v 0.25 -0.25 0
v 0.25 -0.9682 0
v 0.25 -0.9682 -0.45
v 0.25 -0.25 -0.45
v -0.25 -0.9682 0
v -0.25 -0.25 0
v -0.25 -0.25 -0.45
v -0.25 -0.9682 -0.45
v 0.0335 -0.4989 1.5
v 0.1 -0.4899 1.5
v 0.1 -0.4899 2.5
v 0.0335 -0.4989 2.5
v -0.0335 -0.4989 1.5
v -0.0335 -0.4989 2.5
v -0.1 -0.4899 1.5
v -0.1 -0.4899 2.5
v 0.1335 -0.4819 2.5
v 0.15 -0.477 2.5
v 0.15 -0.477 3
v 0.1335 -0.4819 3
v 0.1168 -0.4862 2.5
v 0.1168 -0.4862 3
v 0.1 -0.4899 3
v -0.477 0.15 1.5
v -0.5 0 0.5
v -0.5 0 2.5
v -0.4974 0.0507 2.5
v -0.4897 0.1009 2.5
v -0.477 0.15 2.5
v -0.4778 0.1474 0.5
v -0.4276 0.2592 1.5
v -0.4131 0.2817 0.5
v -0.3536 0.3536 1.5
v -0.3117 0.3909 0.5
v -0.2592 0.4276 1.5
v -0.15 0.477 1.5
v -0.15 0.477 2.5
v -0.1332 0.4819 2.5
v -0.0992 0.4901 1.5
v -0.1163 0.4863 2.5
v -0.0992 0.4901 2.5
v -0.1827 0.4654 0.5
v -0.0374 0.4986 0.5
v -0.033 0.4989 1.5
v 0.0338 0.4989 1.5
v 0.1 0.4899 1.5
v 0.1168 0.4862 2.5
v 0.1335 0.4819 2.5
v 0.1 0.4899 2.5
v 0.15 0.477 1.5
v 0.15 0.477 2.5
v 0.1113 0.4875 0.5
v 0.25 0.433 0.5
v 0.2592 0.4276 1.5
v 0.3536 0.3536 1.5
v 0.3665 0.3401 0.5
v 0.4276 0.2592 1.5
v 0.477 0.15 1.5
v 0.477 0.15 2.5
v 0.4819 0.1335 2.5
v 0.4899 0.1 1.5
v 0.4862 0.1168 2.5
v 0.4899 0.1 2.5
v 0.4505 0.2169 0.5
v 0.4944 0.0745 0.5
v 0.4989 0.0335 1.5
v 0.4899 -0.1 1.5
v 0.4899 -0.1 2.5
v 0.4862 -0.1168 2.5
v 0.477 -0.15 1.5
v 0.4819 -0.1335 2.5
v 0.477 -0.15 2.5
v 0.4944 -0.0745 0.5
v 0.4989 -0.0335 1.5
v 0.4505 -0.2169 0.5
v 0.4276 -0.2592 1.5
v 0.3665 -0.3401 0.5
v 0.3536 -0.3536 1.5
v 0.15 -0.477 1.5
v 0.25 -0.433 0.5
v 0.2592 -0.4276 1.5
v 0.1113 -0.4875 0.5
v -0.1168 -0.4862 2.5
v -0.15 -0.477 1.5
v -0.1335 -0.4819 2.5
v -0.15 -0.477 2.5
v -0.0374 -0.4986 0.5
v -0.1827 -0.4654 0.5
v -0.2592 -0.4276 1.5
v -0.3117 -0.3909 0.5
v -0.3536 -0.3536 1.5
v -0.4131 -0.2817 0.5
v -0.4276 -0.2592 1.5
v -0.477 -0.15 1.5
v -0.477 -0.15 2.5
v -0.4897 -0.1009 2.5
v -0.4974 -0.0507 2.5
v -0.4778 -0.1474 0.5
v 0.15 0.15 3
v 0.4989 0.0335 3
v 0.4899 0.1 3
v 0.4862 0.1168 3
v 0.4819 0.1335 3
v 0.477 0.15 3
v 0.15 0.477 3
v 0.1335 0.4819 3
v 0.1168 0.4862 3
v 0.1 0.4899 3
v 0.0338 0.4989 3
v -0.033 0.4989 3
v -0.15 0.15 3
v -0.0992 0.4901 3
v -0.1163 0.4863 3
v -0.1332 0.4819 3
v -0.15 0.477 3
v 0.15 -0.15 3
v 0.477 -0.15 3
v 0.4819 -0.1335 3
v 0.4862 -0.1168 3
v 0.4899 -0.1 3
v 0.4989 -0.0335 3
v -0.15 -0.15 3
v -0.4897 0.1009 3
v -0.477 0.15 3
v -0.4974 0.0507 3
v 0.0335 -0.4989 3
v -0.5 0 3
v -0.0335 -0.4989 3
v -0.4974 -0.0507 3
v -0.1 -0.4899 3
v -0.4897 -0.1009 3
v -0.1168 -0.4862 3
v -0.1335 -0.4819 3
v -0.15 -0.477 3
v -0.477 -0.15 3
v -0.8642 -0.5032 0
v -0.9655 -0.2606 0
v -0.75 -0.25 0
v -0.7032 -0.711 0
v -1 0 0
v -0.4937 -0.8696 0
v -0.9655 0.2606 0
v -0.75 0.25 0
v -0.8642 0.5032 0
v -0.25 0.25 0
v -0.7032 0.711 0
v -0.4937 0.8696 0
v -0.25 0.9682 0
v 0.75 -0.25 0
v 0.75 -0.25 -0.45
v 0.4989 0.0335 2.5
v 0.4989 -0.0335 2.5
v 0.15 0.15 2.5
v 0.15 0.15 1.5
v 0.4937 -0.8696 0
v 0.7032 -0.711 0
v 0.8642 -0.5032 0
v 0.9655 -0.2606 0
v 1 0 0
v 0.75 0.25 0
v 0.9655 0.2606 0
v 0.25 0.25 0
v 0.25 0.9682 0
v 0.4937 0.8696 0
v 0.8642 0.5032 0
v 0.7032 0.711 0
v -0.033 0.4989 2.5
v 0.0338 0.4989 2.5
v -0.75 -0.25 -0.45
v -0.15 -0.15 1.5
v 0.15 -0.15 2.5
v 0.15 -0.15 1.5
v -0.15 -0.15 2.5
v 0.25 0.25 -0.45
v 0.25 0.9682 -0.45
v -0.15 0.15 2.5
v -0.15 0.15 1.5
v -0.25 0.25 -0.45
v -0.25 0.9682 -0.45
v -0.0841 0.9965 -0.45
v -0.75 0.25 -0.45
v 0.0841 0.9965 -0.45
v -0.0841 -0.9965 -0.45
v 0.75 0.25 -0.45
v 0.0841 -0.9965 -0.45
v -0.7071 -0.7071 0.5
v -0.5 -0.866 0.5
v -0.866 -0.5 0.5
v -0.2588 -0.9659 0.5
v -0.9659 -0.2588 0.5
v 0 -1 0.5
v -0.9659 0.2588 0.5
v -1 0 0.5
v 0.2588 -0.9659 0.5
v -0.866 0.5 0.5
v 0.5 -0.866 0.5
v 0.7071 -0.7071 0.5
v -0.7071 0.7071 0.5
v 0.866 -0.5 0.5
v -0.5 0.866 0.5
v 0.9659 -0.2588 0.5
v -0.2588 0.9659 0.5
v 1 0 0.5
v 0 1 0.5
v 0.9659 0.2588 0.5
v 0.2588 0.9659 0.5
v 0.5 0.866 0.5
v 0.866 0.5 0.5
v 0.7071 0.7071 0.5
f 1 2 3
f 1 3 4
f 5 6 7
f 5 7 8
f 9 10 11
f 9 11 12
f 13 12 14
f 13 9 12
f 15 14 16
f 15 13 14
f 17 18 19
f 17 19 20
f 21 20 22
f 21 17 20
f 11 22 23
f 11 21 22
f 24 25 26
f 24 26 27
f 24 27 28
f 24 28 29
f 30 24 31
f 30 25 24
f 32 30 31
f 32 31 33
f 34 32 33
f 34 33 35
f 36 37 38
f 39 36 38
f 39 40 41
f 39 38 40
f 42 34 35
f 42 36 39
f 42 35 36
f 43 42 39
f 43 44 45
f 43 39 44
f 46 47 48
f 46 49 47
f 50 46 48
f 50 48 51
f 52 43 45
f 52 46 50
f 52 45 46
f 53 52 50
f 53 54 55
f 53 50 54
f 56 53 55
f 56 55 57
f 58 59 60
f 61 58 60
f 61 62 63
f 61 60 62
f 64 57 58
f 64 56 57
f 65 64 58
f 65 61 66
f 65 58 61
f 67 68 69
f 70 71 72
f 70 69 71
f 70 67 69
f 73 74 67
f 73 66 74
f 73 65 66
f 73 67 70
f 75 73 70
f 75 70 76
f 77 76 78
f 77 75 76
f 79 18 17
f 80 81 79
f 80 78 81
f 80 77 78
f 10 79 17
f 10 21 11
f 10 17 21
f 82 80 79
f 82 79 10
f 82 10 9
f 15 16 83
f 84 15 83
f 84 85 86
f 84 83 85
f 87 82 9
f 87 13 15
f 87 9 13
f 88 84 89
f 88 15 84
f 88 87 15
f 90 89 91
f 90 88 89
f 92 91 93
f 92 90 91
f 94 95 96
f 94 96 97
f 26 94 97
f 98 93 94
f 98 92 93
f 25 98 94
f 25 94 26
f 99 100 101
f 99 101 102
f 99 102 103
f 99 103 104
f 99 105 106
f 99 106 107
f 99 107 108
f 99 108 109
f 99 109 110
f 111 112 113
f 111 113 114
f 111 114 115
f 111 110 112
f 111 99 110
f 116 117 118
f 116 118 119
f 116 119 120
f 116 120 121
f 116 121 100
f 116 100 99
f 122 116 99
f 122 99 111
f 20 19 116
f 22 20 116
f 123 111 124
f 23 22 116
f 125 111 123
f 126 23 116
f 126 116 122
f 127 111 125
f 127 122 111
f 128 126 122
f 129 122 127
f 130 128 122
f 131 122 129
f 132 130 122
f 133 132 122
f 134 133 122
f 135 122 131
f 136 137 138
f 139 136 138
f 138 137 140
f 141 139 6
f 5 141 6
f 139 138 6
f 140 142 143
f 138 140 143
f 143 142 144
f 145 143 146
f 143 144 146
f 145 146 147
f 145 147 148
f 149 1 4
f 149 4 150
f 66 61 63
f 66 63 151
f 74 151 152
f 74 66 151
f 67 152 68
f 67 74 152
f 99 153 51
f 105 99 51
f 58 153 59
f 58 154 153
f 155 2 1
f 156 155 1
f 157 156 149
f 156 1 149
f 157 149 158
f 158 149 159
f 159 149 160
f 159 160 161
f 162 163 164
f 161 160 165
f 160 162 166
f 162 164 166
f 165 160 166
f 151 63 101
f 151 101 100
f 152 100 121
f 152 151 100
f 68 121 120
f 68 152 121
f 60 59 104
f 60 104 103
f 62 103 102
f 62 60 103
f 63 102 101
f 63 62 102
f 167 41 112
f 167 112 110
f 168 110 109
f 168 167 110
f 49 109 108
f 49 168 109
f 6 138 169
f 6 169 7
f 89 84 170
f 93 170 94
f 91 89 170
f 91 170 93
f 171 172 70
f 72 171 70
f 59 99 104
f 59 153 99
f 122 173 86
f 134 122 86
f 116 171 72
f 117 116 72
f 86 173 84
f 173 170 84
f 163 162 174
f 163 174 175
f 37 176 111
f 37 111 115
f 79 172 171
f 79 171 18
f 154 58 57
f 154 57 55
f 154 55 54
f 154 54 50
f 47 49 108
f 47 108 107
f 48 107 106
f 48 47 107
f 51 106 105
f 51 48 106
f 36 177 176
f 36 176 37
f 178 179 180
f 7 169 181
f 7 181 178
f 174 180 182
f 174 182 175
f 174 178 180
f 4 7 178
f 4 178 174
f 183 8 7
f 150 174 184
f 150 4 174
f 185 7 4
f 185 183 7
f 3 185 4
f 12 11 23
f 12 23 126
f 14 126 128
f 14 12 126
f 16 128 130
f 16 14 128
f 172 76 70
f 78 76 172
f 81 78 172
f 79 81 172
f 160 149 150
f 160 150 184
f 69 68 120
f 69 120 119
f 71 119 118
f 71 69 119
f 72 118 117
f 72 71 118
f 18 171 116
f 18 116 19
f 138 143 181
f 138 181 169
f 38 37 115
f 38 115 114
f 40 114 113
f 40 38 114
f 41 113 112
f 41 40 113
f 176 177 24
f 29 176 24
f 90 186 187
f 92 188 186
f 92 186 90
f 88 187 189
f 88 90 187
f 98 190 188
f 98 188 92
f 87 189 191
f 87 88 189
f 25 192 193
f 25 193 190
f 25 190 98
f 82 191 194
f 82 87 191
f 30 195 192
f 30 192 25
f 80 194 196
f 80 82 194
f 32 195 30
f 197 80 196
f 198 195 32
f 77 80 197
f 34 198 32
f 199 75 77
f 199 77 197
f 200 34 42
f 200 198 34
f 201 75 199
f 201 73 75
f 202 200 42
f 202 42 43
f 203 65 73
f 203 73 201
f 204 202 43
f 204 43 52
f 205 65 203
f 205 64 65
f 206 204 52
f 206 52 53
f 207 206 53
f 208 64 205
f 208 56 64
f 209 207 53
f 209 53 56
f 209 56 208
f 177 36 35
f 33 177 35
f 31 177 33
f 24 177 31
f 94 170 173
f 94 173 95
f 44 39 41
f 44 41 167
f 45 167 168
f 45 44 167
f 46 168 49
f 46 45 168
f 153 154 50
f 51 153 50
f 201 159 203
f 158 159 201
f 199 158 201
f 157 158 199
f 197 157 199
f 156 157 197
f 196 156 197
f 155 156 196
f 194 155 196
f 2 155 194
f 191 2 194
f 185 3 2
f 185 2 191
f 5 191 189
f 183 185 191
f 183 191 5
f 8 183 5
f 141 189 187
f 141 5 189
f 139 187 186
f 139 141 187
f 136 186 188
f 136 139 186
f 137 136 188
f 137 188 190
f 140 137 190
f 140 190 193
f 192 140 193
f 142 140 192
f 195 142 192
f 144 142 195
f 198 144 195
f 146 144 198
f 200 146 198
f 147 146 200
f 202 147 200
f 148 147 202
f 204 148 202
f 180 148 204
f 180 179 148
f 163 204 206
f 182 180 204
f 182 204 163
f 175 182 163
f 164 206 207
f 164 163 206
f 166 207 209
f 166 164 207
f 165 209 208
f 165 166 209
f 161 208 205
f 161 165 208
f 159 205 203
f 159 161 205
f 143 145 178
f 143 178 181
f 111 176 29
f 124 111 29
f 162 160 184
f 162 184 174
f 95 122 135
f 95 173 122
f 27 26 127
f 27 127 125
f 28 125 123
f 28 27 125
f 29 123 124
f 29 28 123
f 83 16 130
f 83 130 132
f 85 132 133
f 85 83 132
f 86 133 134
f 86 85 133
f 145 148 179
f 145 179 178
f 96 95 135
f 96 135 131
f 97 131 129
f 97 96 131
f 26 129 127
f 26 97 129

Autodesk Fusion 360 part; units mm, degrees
sketch "Sketch1" plane through (0, 0, 0) normal (0, 0, 1) x (1, 0, 0)
  circle A0 centre (0, 0) radius 1
extrude "Extrude1" add sketch "Sketch1" along normal blind 0.5
sketch "Sketch2" plane through (0, 0, 0.5) normal (0, 0, 1) x (-1, 0, 0)
  circle A0 centre (0, 0) radius 1
  circle A1 centre (0, 0) radius 0.5
extrude "Extrude2" add sketch "Sketch2" along normal blind 1 contours A1
sketch "Sketch3" plane through (0, 0, 1.5) normal (0, 0, 1) x (-1, 0, 0)
  circle A0 centre (0, 0) radius 0.5
  arc A1 (-0.1, -0.4899) -> (0.0992, -0.4901) centre (0, 0) ccw
  arc A2 (0.4899, -0.1) -> (0.4901, 0.0992) centre (0, 0) ccw
  arc A3 (0.1, 0.4899) -> (-0.1, 0.4899) centre (0, 0) ccw
  arc A4 (-0.4899, 0.1) -> (-0.4899, -0.1) centre (0, 0) ccw
  arc A5 (-0.15, -0.477) -> (0.15, -0.477) centre (0, 0) ccw
  arc A6 (-0.477, 0.15) -> (-0.477, -0.15) centre (0, 0) ccw
  arc A7 (0.477, -0.15) -> (0.477, 0.15) centre (0, 0) ccw
  arc A8 (0.15, 0.477) -> (-0.15, 0.477) centre (0, 0) ccw
  line L0 (-0.15, -0.15) -> (-0.15, -0.45)
  line L1 (-0.15, -0.45) -> (-0.15, -0.477)
  line L2 (-0.15, -0.15) -> (-0.477, -0.15)
  line L3 (0.15, -0.15) -> (0.15, -0.477)
  line L4 (0.15, -0.15) -> (0.477, -0.15)
  line L5 (-0.15, 0.15) -> (-0.477, 0.15)
  line L6 (-0.15, 0.15) -> (-0.15, 0.477)
  line L7 (0.15, 0.15) -> (0.15, 0.477)
  line L8 (0.15, 0.15) -> (0.477, 0.15)
extrude "Extrude4" add sketch "Sketch3" along normal blind 1 contours A0 A1 A2 A3 A4 A5 A6 A7 A8 L0 L1 L2 L3 L4 L5 L6 L7 L8
sketch "Sketch4" plane through (0, 0, 0) normal (0, 0, -1) x (1, 0, 0)
  circle A0 centre (0, 0) radius 1
  line L0 (0.25, -0.25) -> (0.25, -0.9682)
  line L1 (0.25, 0.9682) -> (0.25, 0.25)
  line L2 (0.25, 0.25) -> (0.75, 0.25)
  line L3 (0.75, 0.25) -> (0.75, -0.25)
  line L4 (-0.75, -0.25) -> (-0.75, 0.25)
  line L5 (-0.75, 0.25) -> (-0.25, 0.25)
  line L6 (-0.25, -0.9682) -> (-0.25, -0.25)
  line L7 (-0.25, 0.25) -> (-0.25, 0.9682)
  arc A1 (0.25, 0.9682) -> (-0.25, 0.9682) centre (0, 0) ccw
  arc A2 (-0.25, -0.9682) -> (0.25, -0.9682) centre (0, 0) ccw
  line L8 (0.75, -0.25) -> (0.25, -0.25)
  line L9 (-0.25, -0.25) -> (-0.75, -0.25)
extrude "Extrude5" add sketch "Sketch4" along normal blind 0.45 contours A0 L0 L1 L2 L3 L4 L5 L6 L7 A1 A2 L8 L9
extrude "Extrude6" add 1 faces at (-0.2667, 0, 2.5) along direction (0, 0, 1) blind 0.5
